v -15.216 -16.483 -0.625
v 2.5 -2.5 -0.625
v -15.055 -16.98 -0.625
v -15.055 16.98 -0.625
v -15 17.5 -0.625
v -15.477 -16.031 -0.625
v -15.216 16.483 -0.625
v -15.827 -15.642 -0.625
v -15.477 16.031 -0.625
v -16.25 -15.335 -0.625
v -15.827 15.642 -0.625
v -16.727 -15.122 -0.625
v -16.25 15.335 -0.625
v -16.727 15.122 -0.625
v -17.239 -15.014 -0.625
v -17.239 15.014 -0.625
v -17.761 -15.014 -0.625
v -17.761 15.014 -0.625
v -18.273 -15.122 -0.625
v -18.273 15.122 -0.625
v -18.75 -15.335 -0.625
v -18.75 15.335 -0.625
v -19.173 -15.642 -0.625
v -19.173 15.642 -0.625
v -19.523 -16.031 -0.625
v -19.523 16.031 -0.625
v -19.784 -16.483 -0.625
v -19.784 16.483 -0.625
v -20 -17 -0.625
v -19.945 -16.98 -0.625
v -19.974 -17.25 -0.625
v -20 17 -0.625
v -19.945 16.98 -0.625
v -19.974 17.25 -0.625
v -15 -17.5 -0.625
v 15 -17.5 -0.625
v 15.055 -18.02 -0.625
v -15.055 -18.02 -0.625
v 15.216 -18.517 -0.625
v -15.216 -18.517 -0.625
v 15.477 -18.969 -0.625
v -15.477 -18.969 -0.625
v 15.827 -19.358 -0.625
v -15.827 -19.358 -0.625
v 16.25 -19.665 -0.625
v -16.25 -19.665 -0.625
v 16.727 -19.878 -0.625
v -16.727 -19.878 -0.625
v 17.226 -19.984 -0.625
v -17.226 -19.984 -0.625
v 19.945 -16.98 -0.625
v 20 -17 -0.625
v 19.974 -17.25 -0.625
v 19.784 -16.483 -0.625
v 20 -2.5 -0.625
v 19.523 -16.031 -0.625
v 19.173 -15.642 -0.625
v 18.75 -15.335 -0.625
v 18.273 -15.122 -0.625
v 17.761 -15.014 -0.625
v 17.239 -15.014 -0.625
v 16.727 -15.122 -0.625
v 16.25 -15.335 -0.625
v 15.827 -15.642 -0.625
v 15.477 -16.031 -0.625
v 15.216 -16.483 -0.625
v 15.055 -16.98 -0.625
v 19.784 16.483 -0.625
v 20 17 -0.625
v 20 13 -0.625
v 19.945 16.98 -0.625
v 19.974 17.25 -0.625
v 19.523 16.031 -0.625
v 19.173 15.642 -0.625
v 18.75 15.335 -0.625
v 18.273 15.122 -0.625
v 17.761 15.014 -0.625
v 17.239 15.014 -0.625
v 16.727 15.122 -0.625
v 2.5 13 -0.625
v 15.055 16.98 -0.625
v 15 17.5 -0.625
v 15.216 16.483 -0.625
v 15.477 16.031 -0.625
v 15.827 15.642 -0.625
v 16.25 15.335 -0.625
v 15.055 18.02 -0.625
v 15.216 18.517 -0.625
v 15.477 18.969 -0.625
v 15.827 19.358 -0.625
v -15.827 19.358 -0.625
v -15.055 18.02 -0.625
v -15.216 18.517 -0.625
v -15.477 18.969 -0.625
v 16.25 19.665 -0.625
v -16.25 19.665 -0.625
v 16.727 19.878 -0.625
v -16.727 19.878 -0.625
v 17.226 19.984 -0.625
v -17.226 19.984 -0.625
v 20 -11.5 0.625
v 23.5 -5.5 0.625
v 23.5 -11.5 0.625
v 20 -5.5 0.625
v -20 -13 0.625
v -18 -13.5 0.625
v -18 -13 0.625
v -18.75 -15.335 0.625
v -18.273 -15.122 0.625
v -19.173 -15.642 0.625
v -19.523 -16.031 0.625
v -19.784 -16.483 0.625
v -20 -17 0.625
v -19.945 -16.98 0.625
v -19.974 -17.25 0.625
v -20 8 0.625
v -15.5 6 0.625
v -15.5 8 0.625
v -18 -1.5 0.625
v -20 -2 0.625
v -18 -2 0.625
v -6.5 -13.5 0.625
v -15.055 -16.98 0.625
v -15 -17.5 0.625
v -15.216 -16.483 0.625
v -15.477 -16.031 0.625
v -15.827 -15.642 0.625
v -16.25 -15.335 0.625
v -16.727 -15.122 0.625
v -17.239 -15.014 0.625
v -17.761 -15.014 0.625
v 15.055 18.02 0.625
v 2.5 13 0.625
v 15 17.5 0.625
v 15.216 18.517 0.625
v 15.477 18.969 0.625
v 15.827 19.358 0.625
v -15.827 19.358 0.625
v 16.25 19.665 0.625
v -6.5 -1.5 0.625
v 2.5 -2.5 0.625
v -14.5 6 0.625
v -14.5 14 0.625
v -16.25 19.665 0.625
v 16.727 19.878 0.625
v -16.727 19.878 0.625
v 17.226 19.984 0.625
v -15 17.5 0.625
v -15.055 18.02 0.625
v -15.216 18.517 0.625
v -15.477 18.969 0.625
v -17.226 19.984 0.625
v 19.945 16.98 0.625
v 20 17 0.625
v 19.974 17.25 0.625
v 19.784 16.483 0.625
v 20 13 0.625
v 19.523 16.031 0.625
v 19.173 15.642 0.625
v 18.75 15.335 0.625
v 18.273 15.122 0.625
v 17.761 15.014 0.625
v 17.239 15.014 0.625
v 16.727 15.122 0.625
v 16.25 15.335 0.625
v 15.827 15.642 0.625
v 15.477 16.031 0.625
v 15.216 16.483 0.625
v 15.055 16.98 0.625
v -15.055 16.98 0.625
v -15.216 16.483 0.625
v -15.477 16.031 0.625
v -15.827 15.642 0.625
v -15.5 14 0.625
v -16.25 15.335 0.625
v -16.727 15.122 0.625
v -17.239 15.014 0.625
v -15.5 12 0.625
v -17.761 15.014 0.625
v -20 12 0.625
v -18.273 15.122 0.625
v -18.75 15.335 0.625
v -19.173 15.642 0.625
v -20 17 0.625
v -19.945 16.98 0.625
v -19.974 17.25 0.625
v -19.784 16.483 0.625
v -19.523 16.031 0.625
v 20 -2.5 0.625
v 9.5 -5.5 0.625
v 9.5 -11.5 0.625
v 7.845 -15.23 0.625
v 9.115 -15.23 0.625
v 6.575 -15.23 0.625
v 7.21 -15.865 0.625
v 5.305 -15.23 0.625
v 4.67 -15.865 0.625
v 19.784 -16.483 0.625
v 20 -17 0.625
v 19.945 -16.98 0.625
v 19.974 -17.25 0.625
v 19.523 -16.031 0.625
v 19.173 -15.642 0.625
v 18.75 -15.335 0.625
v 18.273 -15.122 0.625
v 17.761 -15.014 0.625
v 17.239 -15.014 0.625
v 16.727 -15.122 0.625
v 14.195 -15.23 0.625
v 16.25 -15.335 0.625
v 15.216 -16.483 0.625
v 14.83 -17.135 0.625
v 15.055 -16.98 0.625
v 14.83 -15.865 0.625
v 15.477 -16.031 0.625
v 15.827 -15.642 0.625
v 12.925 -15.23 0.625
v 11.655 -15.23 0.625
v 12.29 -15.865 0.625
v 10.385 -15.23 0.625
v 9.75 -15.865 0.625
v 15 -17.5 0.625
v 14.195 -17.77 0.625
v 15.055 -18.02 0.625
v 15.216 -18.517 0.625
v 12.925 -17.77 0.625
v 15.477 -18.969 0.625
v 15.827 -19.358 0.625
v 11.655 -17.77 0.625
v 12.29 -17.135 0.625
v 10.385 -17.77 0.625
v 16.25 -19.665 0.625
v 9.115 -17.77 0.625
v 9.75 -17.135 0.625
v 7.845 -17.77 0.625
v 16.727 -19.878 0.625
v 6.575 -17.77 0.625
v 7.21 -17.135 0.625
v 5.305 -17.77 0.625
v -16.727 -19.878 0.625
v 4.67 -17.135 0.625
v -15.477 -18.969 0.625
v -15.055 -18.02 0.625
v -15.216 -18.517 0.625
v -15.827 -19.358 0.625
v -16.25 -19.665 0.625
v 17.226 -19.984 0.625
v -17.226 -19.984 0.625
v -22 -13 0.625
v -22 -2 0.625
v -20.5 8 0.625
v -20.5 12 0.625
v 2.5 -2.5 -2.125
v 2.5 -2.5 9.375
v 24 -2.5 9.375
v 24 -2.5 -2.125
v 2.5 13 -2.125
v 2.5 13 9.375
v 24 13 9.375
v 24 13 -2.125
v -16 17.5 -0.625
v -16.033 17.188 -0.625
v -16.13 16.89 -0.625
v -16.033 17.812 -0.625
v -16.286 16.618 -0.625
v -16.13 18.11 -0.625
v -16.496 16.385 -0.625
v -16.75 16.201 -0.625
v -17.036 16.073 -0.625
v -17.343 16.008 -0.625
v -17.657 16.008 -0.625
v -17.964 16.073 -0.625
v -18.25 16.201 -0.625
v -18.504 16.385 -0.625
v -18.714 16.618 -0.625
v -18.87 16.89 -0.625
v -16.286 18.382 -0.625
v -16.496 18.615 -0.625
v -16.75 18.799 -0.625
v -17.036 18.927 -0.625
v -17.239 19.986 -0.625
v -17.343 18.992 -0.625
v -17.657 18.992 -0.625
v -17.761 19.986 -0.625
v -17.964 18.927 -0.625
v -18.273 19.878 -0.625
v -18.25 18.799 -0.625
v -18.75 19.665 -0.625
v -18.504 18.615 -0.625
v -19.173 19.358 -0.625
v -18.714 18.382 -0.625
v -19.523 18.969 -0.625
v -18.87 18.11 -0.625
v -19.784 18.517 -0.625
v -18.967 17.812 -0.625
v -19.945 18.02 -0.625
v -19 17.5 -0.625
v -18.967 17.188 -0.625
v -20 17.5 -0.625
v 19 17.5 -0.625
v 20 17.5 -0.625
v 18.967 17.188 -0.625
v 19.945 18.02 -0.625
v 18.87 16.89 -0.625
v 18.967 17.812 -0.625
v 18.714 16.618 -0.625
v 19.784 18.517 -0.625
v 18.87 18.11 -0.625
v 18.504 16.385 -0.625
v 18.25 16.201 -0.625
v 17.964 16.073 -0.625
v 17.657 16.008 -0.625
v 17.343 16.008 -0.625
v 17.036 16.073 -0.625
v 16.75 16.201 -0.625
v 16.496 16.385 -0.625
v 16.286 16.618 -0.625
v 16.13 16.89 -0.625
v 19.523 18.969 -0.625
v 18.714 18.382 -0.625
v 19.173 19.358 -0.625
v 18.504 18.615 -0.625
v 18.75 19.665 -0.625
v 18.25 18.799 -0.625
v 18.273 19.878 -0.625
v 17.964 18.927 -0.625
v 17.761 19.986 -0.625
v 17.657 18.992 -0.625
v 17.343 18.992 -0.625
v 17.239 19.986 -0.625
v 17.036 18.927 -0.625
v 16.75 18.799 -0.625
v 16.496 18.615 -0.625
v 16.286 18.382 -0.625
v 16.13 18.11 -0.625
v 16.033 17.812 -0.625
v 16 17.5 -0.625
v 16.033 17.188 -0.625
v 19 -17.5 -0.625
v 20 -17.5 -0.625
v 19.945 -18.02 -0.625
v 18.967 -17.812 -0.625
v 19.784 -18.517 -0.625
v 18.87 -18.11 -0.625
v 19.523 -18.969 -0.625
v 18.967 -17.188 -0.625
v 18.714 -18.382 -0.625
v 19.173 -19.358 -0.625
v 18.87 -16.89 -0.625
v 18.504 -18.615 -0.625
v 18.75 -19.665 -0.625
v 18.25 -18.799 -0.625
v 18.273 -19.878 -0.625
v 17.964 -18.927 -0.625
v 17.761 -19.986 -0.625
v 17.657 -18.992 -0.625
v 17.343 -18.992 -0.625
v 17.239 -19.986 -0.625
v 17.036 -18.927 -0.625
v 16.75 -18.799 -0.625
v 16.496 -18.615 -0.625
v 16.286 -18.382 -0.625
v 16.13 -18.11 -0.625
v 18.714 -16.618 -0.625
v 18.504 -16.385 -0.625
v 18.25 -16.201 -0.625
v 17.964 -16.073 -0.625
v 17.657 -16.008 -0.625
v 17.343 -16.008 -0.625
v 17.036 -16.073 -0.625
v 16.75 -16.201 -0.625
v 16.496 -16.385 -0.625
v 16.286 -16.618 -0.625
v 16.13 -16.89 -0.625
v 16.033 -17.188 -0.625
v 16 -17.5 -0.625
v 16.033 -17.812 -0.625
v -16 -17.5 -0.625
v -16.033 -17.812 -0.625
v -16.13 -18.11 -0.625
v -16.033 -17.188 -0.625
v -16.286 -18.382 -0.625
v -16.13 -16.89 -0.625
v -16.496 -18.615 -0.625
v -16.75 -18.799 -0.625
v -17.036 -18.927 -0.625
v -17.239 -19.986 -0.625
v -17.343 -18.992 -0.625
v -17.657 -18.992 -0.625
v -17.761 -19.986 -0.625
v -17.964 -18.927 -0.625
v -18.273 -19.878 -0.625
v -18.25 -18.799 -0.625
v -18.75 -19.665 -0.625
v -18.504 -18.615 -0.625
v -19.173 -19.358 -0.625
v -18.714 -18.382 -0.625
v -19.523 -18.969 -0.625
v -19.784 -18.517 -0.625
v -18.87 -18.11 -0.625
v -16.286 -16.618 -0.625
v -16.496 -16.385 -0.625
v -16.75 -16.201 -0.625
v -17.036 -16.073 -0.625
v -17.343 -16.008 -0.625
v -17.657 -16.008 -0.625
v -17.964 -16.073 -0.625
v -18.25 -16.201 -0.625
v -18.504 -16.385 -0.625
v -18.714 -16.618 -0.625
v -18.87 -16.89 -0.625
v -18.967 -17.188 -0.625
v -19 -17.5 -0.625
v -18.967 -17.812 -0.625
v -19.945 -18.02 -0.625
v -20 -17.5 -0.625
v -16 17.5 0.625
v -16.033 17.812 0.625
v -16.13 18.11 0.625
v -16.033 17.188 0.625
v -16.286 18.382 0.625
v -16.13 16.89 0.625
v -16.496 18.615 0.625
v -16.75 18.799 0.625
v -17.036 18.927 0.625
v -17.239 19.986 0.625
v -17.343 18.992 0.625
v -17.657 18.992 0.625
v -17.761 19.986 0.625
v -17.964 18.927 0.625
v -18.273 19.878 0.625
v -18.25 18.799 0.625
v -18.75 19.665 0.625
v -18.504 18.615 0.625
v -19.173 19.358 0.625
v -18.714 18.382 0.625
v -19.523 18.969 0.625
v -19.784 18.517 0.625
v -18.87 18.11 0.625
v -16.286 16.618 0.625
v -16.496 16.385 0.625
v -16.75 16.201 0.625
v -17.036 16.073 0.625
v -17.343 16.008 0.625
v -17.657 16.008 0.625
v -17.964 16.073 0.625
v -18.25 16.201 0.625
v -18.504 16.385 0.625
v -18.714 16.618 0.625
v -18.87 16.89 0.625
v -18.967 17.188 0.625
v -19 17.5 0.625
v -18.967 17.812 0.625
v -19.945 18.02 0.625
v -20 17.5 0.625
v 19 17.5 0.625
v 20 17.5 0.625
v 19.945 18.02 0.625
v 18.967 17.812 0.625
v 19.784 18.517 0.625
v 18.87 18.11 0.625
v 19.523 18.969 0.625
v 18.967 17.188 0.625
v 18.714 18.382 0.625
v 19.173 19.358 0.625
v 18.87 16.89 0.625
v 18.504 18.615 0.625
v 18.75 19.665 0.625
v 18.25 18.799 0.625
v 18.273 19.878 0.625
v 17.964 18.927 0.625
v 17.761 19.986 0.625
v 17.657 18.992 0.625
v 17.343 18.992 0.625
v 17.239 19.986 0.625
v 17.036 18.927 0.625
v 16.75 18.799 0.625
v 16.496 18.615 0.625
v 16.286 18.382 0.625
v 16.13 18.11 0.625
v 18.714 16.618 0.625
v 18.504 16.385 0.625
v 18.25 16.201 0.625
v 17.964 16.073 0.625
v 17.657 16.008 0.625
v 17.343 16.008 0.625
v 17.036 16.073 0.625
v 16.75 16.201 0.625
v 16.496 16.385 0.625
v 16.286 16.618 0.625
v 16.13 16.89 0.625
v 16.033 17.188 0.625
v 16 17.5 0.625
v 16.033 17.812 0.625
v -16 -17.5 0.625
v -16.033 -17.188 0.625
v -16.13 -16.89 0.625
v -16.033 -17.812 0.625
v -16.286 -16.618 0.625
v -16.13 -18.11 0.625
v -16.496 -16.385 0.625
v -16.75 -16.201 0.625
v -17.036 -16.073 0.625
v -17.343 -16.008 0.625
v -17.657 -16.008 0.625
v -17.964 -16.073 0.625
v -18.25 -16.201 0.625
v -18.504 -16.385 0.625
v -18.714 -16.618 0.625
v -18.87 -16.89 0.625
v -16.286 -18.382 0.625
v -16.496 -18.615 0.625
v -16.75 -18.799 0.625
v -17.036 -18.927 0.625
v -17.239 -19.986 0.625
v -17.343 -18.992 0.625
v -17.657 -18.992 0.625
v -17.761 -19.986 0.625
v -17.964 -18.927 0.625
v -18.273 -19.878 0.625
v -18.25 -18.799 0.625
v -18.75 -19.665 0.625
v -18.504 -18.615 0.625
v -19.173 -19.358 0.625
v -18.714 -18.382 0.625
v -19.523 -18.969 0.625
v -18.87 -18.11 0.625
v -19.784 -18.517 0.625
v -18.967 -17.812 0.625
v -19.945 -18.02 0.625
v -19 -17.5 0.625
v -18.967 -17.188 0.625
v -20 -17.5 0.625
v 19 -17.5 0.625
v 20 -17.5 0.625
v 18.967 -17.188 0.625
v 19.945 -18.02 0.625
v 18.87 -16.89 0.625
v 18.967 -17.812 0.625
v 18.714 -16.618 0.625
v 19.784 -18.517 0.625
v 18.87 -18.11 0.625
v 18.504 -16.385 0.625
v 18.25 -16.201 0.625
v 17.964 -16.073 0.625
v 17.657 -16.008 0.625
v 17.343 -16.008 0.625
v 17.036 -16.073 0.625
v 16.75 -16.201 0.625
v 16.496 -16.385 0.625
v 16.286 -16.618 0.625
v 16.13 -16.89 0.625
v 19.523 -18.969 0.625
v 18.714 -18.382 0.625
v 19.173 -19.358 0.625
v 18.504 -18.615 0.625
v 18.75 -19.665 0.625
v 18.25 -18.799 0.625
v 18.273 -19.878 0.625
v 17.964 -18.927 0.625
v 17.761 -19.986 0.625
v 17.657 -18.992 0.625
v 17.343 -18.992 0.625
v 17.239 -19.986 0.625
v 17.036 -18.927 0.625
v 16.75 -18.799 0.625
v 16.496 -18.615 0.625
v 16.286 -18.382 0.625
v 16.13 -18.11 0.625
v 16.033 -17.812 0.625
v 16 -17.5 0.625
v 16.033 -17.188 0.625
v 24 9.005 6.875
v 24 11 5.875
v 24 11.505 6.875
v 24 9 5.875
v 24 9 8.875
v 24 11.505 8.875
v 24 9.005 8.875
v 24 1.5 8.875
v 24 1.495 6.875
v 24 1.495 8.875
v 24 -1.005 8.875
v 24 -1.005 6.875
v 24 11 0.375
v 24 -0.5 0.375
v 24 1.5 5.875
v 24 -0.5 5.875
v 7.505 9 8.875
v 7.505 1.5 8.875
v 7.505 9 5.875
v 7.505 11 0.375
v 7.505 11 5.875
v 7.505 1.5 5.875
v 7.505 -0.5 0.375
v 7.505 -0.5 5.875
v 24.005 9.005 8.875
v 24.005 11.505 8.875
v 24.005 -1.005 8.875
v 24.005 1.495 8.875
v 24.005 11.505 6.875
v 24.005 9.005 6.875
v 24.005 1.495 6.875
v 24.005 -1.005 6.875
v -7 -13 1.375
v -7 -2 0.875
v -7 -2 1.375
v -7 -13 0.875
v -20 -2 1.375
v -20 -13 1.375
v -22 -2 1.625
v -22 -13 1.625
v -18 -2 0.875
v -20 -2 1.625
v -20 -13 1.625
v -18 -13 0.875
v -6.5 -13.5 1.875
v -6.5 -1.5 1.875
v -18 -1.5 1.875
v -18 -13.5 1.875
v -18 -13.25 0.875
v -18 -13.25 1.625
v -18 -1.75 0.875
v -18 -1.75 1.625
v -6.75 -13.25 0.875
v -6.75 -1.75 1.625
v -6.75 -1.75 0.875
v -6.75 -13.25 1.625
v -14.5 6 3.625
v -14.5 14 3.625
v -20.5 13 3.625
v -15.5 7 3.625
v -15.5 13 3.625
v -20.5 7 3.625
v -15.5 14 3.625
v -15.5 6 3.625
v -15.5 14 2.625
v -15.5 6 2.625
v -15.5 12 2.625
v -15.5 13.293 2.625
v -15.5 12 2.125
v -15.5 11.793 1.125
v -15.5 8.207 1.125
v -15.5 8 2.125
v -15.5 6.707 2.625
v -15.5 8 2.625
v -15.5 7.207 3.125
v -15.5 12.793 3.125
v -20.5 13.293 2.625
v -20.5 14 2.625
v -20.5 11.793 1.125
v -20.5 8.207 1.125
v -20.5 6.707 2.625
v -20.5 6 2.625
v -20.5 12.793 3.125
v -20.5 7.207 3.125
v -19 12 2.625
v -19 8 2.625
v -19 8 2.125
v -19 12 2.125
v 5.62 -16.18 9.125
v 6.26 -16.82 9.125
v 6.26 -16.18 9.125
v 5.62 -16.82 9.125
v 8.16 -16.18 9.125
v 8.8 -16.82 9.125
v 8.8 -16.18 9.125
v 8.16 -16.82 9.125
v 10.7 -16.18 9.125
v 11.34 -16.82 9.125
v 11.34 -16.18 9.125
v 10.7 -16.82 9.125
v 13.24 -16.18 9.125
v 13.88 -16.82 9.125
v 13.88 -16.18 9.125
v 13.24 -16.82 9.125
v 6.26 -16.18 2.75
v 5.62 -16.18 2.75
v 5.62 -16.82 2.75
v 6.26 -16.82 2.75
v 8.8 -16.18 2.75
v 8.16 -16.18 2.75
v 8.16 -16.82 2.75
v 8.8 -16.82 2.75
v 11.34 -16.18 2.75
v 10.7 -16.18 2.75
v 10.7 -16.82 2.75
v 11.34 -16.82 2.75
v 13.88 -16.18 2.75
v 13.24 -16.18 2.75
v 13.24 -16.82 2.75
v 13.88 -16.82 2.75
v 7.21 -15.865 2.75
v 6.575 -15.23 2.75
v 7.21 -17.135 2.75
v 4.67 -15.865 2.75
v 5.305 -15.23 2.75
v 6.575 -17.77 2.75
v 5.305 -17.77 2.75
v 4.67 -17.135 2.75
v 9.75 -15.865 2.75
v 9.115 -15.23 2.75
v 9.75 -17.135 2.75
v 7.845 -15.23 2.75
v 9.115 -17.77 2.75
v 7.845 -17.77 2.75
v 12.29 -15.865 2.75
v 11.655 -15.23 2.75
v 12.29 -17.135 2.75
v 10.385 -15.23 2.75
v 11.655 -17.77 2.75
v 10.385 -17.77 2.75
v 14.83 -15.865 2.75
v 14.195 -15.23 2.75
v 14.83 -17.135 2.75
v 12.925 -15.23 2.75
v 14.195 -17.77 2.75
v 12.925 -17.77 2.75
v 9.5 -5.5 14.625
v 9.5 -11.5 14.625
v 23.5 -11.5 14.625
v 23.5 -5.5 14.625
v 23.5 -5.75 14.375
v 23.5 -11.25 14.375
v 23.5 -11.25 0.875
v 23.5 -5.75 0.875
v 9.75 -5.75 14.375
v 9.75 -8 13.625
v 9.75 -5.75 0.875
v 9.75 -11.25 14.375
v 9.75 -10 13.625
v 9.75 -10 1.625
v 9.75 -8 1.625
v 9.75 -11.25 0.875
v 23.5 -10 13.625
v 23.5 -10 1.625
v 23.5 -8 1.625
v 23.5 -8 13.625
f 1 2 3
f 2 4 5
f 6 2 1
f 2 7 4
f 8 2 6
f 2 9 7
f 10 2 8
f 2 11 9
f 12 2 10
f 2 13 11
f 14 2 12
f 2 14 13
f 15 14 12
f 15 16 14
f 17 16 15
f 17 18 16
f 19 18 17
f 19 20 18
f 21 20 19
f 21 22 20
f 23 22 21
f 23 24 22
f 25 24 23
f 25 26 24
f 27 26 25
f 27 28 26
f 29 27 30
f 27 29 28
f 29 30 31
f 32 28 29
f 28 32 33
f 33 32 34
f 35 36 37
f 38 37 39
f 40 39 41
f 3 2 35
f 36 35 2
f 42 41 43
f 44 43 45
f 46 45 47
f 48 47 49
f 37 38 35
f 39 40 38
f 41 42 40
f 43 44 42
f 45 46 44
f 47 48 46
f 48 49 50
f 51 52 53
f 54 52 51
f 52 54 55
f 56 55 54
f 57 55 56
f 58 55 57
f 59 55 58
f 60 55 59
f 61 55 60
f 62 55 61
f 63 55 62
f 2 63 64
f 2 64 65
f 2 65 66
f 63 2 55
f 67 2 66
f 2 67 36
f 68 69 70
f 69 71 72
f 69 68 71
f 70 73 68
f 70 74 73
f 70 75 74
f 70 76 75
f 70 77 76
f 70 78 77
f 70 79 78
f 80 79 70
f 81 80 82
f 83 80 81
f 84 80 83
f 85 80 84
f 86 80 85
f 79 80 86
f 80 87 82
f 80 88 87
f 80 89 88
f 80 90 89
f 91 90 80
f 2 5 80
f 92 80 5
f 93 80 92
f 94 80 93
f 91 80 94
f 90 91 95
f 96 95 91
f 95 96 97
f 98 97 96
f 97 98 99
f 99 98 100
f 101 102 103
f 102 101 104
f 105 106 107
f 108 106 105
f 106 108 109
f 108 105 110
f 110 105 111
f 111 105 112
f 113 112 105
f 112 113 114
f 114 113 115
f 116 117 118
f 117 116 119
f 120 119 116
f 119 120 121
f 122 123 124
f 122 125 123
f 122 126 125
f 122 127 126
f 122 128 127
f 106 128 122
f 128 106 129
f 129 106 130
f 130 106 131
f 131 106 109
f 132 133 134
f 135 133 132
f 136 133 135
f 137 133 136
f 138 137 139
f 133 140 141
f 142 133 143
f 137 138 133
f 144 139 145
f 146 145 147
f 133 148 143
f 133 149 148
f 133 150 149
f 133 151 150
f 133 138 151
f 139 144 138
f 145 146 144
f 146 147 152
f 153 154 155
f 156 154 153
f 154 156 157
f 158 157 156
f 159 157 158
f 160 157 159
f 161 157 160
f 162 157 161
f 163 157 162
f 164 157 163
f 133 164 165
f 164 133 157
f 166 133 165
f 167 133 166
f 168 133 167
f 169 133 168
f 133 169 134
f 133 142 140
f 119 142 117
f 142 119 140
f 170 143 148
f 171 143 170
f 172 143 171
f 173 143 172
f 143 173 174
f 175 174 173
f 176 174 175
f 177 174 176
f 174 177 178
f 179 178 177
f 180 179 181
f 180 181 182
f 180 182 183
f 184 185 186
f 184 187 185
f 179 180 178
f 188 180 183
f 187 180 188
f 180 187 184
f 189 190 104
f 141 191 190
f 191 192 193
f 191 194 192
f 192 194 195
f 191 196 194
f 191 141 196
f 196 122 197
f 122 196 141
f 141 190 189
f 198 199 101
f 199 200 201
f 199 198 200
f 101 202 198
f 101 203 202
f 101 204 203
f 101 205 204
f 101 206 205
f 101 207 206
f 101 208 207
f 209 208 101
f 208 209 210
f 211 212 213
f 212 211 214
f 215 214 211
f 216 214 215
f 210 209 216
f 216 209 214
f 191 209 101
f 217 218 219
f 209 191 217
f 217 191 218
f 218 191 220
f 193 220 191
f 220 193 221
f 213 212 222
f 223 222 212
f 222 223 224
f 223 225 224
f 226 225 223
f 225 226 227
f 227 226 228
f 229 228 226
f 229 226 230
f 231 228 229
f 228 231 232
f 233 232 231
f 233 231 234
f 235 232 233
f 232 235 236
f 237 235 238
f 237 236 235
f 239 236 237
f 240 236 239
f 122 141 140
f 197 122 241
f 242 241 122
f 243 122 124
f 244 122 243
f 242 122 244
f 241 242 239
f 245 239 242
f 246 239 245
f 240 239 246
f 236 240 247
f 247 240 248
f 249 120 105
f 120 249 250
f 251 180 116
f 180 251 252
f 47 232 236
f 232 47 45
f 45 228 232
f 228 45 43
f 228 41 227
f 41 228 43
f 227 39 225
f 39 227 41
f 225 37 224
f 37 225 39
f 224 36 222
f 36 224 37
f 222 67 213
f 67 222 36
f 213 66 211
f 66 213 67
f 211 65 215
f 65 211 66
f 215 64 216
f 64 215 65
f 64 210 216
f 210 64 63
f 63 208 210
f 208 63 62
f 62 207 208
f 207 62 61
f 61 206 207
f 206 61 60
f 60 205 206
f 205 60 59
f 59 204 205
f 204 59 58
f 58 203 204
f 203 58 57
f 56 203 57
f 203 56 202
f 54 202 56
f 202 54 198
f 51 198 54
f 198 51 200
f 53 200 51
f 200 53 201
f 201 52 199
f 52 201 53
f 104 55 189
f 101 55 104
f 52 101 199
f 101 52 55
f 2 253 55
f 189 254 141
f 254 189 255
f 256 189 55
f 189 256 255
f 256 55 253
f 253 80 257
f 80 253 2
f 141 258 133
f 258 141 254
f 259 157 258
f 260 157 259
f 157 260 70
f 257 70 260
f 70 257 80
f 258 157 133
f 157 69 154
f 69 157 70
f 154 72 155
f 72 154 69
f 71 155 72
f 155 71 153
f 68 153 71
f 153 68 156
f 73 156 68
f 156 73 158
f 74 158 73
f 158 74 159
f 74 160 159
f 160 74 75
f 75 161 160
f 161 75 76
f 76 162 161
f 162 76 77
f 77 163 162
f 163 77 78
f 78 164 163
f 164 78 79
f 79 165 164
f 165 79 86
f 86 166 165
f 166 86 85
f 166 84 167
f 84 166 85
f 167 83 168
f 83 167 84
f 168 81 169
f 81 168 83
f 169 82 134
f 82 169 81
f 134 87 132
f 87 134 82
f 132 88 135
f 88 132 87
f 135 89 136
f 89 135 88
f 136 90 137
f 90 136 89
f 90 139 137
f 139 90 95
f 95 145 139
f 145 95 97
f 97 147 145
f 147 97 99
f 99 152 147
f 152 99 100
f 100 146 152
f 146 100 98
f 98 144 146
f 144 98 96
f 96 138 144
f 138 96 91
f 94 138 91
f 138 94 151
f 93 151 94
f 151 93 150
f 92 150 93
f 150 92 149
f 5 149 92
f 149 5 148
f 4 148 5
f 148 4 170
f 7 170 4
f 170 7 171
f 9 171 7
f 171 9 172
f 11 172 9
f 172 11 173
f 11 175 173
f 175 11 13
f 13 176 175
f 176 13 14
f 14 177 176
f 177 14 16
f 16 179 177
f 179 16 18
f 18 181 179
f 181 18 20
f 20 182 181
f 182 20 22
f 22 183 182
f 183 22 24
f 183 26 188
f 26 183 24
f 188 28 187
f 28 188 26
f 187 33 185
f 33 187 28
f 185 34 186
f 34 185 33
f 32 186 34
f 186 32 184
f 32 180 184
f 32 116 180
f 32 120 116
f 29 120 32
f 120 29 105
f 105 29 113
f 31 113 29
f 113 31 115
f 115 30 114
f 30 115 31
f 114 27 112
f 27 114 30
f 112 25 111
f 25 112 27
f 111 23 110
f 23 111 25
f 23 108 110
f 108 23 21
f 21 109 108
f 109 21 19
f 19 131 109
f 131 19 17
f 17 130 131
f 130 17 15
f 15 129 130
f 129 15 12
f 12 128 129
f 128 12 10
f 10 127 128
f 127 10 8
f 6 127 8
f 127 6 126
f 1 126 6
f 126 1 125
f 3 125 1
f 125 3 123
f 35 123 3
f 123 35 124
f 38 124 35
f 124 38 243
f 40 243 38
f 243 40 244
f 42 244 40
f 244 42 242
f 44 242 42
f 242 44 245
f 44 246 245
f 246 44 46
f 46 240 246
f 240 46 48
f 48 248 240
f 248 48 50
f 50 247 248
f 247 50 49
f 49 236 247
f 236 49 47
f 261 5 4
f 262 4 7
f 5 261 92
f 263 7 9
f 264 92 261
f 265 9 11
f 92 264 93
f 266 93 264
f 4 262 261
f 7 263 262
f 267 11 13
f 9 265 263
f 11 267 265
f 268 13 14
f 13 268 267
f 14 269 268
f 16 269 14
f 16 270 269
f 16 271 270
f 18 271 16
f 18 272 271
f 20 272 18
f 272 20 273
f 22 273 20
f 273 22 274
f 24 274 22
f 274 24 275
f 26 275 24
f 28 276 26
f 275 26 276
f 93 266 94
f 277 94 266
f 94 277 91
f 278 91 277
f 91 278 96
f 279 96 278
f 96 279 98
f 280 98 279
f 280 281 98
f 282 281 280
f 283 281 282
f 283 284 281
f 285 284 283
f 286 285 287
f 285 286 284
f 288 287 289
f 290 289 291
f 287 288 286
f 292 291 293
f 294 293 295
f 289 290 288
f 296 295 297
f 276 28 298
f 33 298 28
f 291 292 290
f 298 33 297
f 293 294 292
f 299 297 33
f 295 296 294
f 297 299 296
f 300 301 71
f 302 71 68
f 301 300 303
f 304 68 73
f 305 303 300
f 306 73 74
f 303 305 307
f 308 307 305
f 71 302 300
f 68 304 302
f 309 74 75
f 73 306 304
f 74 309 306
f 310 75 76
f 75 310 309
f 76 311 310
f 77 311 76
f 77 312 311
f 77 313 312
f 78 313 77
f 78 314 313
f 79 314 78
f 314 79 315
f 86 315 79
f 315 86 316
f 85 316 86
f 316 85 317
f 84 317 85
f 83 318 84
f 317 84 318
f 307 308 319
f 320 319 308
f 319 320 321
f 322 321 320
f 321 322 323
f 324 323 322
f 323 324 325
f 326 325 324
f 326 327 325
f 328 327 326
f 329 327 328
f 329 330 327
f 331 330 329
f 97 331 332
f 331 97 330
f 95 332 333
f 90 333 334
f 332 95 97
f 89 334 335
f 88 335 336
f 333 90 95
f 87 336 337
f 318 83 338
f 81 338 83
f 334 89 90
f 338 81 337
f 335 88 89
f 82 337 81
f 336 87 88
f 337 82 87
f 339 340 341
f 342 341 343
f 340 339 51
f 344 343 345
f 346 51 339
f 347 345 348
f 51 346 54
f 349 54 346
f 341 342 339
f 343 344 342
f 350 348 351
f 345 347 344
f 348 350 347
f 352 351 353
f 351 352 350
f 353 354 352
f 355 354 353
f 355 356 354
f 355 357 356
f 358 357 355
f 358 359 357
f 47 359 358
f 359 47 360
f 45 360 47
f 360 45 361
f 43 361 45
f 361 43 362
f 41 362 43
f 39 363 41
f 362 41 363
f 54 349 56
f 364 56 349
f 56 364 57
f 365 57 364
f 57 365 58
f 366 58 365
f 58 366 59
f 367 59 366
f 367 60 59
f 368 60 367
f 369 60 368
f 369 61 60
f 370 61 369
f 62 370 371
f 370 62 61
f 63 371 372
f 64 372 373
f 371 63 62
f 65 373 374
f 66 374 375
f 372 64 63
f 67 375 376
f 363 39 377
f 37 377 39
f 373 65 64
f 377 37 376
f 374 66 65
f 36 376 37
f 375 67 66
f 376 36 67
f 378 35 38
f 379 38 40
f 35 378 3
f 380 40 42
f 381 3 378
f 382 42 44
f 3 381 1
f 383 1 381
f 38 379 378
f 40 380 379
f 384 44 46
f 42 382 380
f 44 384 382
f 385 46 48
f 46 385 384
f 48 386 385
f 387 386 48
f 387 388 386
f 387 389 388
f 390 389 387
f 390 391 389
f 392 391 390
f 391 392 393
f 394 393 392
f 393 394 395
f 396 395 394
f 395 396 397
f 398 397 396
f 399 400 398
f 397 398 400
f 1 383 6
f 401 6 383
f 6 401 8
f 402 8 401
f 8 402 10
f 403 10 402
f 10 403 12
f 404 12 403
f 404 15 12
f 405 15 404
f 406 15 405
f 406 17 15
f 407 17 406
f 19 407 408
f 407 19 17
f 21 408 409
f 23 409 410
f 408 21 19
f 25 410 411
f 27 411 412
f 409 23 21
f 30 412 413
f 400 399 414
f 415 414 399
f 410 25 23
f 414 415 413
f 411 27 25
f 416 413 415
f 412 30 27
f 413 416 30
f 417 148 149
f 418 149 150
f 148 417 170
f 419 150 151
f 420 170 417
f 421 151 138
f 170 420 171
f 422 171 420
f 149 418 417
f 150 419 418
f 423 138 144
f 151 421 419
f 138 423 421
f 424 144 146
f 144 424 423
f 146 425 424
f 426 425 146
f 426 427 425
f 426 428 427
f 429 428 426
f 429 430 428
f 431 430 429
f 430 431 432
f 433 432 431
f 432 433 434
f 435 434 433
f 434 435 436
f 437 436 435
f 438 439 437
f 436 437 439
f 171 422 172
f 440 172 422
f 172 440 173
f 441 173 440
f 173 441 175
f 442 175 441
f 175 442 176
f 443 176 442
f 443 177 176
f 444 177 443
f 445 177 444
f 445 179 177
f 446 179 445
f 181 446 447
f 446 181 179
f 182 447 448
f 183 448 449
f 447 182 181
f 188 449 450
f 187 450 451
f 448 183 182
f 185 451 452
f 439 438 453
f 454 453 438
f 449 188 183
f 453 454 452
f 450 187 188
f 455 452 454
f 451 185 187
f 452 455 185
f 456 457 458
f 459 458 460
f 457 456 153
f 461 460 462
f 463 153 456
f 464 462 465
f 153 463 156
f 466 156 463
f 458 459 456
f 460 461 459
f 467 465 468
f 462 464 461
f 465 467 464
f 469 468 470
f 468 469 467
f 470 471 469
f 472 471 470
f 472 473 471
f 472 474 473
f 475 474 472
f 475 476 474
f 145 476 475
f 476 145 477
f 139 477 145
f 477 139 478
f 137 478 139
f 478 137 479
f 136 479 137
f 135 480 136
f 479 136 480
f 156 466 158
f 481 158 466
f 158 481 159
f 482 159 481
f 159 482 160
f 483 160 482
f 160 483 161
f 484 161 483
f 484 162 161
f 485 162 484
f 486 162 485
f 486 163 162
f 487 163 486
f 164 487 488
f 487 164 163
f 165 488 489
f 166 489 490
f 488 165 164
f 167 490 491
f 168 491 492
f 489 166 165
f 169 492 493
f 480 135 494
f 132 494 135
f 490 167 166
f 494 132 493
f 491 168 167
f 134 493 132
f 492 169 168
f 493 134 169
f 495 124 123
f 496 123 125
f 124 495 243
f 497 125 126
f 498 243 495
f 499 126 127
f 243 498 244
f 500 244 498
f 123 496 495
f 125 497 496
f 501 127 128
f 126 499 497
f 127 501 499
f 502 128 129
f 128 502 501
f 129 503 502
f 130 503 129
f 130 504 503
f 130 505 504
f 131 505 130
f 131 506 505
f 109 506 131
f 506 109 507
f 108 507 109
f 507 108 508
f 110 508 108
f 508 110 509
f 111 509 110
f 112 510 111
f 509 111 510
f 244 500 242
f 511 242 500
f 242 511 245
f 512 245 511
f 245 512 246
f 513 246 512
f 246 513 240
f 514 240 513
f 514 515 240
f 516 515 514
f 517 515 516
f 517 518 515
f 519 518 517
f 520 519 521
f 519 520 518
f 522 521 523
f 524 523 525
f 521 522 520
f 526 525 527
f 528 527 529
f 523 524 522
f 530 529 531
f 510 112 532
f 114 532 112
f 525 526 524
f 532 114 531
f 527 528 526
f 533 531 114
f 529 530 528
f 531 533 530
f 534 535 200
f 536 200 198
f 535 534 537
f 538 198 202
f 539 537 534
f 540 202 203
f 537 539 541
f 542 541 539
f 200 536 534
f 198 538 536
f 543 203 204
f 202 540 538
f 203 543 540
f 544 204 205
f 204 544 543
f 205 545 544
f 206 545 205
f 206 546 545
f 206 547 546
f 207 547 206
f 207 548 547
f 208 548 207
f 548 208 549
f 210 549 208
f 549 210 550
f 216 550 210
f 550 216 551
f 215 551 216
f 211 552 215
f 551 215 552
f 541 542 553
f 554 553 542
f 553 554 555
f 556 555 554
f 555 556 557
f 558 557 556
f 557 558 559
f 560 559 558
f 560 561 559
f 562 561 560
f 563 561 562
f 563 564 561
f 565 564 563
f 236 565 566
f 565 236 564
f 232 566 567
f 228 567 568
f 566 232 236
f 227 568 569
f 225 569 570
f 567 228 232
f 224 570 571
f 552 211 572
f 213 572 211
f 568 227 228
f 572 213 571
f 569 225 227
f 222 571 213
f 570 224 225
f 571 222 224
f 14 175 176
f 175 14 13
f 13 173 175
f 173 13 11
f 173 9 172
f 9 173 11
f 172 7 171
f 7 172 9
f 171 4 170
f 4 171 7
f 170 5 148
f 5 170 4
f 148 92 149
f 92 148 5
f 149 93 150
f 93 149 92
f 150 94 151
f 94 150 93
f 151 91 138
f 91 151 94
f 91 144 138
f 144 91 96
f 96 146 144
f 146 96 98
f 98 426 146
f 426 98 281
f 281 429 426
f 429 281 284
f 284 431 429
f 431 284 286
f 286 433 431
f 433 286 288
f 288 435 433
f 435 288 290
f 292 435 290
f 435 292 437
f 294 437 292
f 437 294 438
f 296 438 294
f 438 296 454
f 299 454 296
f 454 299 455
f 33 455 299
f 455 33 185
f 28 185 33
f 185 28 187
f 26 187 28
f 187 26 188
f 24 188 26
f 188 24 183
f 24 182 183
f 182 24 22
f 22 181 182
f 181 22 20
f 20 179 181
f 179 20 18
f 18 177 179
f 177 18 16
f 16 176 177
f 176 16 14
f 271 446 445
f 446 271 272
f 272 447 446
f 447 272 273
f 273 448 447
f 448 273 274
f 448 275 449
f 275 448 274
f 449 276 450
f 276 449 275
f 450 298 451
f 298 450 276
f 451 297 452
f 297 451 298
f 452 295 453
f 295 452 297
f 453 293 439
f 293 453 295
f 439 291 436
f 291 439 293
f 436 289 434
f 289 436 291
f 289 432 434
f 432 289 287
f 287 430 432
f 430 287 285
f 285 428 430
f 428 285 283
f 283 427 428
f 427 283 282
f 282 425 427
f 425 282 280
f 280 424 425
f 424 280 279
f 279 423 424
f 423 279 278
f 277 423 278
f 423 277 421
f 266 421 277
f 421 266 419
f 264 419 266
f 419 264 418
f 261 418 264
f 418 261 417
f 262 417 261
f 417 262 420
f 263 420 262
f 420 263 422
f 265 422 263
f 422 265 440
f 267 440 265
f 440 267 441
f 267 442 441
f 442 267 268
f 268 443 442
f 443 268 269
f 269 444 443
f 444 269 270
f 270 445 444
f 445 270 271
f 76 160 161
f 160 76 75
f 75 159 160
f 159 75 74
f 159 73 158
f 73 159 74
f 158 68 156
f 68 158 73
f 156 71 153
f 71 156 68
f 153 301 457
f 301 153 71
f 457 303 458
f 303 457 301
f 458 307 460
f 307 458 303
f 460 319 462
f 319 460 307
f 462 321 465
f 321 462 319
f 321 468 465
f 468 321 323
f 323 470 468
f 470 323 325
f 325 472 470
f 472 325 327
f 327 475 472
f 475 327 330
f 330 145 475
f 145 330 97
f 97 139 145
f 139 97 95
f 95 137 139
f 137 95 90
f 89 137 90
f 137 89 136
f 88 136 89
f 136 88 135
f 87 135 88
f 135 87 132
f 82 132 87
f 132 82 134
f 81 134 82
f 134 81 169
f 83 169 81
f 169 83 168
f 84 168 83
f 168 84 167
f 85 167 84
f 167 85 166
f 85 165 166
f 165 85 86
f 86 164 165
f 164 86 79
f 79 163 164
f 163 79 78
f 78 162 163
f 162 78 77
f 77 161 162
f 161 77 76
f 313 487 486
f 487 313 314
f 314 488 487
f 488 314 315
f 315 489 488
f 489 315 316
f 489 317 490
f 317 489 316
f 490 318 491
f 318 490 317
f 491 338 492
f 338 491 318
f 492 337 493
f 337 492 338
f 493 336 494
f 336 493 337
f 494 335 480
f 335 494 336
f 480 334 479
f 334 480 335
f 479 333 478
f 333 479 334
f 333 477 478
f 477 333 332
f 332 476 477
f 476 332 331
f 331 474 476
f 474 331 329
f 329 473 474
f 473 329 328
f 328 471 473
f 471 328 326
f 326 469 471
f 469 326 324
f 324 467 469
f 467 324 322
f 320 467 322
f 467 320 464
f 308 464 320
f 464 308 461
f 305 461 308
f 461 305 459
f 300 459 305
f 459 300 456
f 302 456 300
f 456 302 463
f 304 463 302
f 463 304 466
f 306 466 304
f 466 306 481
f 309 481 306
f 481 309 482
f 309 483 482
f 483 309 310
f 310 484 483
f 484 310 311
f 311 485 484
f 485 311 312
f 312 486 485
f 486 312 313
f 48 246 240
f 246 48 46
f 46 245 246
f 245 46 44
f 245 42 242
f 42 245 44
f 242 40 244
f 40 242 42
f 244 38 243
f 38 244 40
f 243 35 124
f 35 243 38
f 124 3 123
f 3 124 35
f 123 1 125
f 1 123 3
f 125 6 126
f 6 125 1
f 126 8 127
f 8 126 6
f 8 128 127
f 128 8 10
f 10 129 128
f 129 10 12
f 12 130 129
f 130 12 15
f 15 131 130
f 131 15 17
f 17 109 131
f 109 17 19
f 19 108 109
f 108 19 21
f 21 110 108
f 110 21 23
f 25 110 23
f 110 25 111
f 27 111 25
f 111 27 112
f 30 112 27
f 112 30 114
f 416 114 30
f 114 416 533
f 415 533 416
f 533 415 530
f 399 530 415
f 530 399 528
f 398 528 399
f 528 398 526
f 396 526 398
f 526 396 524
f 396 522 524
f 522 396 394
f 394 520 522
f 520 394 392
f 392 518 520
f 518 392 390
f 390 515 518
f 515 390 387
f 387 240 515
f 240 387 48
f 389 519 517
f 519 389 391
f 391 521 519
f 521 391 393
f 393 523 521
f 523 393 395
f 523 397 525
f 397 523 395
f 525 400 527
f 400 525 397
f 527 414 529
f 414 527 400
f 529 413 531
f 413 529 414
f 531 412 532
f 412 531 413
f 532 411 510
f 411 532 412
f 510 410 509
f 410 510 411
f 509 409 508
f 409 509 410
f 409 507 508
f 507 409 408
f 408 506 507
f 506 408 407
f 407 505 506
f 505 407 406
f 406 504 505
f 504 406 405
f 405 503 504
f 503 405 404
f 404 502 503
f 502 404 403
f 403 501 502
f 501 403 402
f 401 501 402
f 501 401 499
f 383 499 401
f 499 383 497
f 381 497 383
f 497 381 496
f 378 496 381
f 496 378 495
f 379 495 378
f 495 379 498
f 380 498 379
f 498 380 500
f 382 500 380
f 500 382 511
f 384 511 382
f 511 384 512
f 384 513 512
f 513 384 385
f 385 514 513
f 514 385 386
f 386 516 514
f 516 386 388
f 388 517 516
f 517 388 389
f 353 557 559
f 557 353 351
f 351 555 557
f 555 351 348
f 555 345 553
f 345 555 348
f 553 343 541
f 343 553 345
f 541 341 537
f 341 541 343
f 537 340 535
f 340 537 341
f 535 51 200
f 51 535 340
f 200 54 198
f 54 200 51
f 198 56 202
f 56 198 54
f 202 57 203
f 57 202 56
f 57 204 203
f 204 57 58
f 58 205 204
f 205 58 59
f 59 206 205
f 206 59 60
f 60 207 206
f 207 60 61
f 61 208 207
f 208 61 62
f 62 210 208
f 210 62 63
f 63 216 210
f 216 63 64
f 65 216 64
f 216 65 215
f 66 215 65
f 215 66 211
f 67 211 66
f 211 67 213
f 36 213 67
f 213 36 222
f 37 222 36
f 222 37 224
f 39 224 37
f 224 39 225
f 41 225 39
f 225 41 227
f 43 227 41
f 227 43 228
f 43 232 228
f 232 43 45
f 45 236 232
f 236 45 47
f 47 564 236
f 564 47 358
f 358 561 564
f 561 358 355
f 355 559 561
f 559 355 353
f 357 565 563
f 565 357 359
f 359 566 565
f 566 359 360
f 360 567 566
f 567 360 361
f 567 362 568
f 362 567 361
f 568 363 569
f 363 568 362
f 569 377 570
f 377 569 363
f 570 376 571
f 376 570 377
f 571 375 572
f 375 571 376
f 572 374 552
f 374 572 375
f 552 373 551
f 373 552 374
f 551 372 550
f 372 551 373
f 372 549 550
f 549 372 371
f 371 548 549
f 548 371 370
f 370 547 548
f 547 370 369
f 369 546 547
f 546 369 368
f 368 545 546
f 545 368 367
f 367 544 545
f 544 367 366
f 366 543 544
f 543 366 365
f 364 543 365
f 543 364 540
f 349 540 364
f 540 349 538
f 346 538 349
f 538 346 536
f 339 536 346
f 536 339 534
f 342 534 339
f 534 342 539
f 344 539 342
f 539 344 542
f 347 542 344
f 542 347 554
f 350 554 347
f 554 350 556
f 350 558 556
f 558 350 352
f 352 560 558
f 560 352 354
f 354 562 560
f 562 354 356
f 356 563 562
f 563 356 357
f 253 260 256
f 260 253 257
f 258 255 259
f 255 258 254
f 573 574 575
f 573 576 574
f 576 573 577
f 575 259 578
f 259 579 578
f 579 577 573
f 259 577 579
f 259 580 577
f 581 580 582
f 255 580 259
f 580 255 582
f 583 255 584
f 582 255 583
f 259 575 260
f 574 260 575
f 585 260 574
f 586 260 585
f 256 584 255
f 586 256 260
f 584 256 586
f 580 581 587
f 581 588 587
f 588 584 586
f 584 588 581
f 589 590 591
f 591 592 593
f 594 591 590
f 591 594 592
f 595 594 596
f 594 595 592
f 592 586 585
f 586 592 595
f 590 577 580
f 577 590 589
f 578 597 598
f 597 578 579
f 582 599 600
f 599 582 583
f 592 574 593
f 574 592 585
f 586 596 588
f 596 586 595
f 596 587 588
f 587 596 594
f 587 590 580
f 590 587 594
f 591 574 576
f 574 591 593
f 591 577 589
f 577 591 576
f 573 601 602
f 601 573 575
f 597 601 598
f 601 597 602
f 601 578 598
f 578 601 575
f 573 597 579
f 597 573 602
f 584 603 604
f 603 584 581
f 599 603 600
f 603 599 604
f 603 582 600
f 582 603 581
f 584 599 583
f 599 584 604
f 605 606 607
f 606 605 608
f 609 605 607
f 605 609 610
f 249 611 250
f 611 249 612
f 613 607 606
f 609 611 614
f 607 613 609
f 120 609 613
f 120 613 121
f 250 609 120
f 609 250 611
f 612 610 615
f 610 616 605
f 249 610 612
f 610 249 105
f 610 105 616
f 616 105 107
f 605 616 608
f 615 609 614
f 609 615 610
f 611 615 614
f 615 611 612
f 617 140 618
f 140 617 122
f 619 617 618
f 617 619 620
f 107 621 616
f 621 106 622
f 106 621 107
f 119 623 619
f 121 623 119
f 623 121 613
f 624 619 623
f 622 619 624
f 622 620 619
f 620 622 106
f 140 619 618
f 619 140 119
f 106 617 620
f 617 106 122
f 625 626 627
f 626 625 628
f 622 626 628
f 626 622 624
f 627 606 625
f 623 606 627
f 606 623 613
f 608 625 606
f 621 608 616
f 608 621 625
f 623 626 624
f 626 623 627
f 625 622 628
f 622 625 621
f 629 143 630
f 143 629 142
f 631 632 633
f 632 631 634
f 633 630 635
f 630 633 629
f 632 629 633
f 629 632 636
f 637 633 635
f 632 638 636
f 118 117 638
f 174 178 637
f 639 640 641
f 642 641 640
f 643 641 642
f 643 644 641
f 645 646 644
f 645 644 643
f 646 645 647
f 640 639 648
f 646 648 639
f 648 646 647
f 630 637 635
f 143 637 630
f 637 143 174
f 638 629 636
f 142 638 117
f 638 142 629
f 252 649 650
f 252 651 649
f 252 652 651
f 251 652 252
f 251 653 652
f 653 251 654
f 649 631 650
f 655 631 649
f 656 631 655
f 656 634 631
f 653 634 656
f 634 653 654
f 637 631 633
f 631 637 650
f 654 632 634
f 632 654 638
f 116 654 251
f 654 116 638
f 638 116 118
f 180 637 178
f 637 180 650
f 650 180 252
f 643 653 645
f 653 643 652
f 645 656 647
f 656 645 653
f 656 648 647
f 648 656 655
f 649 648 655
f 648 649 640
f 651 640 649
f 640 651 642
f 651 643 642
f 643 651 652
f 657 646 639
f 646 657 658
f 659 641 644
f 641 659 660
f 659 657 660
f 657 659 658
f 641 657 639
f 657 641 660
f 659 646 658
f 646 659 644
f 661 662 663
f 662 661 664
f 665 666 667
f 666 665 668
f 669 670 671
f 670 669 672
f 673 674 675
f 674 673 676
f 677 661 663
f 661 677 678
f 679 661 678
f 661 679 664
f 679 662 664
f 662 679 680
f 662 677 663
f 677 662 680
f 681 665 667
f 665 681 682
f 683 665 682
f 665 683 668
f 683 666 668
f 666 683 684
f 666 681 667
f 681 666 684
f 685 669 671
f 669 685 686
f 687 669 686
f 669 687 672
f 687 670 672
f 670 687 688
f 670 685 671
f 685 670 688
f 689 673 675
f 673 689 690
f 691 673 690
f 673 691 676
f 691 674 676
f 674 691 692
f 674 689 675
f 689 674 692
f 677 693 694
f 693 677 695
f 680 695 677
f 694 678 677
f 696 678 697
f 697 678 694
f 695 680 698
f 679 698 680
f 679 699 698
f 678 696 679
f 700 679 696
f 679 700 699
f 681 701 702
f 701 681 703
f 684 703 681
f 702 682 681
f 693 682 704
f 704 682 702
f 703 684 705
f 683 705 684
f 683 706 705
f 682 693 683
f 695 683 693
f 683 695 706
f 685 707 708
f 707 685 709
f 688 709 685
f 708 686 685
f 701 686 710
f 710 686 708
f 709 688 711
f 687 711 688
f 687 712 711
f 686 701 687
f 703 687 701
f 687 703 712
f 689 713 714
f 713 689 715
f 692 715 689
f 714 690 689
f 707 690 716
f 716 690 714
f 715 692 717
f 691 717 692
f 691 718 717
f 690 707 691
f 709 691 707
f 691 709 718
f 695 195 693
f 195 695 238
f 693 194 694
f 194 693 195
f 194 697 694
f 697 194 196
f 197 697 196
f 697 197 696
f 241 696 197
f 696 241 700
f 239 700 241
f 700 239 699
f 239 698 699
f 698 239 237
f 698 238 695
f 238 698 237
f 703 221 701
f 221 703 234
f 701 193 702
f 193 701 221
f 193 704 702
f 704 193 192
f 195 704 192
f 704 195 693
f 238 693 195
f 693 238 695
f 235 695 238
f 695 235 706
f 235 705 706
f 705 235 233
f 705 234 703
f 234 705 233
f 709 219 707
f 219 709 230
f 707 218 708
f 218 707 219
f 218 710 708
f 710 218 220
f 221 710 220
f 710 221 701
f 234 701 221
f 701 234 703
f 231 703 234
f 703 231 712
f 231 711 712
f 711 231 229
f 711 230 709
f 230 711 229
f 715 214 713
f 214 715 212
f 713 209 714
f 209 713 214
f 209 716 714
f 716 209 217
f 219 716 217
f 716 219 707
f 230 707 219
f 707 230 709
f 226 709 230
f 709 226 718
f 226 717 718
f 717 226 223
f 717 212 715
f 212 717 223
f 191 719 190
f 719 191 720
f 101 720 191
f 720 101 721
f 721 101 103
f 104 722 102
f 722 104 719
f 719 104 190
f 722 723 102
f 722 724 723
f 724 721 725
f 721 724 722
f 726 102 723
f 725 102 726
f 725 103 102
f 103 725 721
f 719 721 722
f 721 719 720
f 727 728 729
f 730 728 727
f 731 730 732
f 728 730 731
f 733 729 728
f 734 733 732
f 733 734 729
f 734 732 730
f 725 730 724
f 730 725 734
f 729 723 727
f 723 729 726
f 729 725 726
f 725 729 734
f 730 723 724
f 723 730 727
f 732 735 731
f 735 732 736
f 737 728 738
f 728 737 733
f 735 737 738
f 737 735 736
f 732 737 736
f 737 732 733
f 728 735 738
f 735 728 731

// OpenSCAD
// Copyright (c) 2017 Clément Bœsch <u pkh.me>
//
// Permission to use, copy, modify, and distribute this software for any
// purpose with or without fee is hereby granted, provided that the above
// copyright notice and this permission notice appear in all copies.
//
// THE SOFTWARE IS PROVIDED "AS IS" AND THE AUTHOR DISCLAIMS ALL WARRANTIES
// WITH REGARD TO THIS SOFTWARE INCLUDING ALL IMPLIED WARRANTIES OF
// MERCHANTABILITY AND FITNESS. IN NO EVENT SHALL THE AUTHOR BE LIABLE FOR
// ANY SPECIAL, DIRECT, INDIRECT, OR CONSEQUENTIAL DAMAGES OR ANY DAMAGES
// WHATSOEVER RESULTING FROM LOSS OF USE, DATA OR PROFITS, WHETHER IN AN
// ACTION OF CONTRACT, NEGLIGENCE OR OTHER TORTIOUS ACTION, ARISING OUT OF
// OR IN CONNECTION WITH THE USE OR PERFORMANCE OF THIS SOFTWARE.

include <../globals.scad>

use <../case.scad>
use <../utils.scad>
use <../electronics/header.scad>
use <../electronics/network.scad>
use <../electronics/sd.scad>
use <../electronics/usb.scad>


board_dim = [40, 40, 1.25];


/* Plate holes */
hole_d = 3;
hole_orig = [board_dim[0], board_dim[1]] * -.5;
ring_off = 2;
hole_pad = 2.5;
hole_pad_t = [1,-1]*hole_pad;
holes_pos = [for (y=hole_pad_t+[0, board_dim[1]],
                  x=hole_pad_t+[0, board_dim[0]]) hole_orig + [x, y]];


/* Components bounding box dimensions */
ethernet_dim    = [21.5, 15.5, 11.5];
microsdcard_dim = [  15,   11,    1];
microsdslot_dim = [11.5,   12, 1.25];
microusb_dim    = [   6,    8,    3];
serial_dim      = [10.5,  2.5,  8.5];
usb_dim         = [  14,   14,    6];

ethusb_dim      = [  14, 8.75,    3];


module nanopi_neo2_plate_2d(cut=false) {
    difference() {
        plate_2d(board_dim[0], board_dim[1], corner_radius=3);

        // The plate is actually cut such that the ethernet slot is stuck in
        // the middle. We prevent displaying it in the board here, will still
        // keeping the plate shape untouched by default for the case
        if (cut)
            translate([(board_dim[0]-ethernet_dim[0])/2 + 4,
                       (board_dim[1]-ethernet_dim[1])/2 - 7])
                square([ethernet_dim[0], ethernet_dim[1]], center=true);
    }
}

comp_info = [
    /* info function        box dimensions   comp-corner rotate  board-corner    position  */
    [ethernet_info(),       ethernet_dim,    [ 1,-1, 1], [2,0,0], [ 1, 1,-1], [  4,  -7,-1.5]],
    [microsdcard_info(),    microsdcard_dim, [ 1, 1,-1], [0,0,2], [-1,-1, 1], [ -2,   7,   0]],
    [microsdslot_info(),    microsdslot_dim, [ 1, 1,-1], [0,0,2], [-1,-1, 1], [  2,6.50,   0]],
    [microusb_info(),       microusb_dim,    [ 1,-1,-1], [0,0,2], [-1, 1, 1], [-.5,  -6,   0]],
    [pin_header_info(),     serial_dim,      [ 1,-1,-1], [0,0,0], [ 1,-1, 1], [ -5,2.25,   0]],
    [usb_info(),            usb_dim,         [ 1,-1, 1], [1,0,0], [ 1,-1, 1], [3.5, 8.5,   0]],

    [unknown_info(),        ethusb_dim,      [ 1,-1, 1], [1,0,0], [ 1,-1, 1], [3.5,14.5,0]],
];

module nanopi_neo2() {
    extrude_plate(board_dim[2], holes_pos, hole_d, ring_off, clr=c_darkblue)
        nanopi_neo2_plate_2d(cut=true);

    set_components(board_dim, comp_info) {
        ethernet(dim=ethernet_dim, swap_led=true);
        microsdcard(dim=microsdcard_dim);
        microsdslot(dim=microsdslot_dim);
        microusb(dim=microusb_dim);
        pin_header_pitch254(dim=serial_dim, n=4, m=1);
        usb(dim=usb_dim, has_folding=false);

        %cube(ethusb_dim, center=true);
    }
}

function nanopi_neo2_info() = [
    ["board_dim",  board_dim],
    ["components", comp_info],
    ["holes_d",    hole_d],
    ["holes_pos",  holes_pos],
];

demo_board(board_dim) {
    nanopi_neo2();
    *#bounding_box(board_dim, comp_info);
}
